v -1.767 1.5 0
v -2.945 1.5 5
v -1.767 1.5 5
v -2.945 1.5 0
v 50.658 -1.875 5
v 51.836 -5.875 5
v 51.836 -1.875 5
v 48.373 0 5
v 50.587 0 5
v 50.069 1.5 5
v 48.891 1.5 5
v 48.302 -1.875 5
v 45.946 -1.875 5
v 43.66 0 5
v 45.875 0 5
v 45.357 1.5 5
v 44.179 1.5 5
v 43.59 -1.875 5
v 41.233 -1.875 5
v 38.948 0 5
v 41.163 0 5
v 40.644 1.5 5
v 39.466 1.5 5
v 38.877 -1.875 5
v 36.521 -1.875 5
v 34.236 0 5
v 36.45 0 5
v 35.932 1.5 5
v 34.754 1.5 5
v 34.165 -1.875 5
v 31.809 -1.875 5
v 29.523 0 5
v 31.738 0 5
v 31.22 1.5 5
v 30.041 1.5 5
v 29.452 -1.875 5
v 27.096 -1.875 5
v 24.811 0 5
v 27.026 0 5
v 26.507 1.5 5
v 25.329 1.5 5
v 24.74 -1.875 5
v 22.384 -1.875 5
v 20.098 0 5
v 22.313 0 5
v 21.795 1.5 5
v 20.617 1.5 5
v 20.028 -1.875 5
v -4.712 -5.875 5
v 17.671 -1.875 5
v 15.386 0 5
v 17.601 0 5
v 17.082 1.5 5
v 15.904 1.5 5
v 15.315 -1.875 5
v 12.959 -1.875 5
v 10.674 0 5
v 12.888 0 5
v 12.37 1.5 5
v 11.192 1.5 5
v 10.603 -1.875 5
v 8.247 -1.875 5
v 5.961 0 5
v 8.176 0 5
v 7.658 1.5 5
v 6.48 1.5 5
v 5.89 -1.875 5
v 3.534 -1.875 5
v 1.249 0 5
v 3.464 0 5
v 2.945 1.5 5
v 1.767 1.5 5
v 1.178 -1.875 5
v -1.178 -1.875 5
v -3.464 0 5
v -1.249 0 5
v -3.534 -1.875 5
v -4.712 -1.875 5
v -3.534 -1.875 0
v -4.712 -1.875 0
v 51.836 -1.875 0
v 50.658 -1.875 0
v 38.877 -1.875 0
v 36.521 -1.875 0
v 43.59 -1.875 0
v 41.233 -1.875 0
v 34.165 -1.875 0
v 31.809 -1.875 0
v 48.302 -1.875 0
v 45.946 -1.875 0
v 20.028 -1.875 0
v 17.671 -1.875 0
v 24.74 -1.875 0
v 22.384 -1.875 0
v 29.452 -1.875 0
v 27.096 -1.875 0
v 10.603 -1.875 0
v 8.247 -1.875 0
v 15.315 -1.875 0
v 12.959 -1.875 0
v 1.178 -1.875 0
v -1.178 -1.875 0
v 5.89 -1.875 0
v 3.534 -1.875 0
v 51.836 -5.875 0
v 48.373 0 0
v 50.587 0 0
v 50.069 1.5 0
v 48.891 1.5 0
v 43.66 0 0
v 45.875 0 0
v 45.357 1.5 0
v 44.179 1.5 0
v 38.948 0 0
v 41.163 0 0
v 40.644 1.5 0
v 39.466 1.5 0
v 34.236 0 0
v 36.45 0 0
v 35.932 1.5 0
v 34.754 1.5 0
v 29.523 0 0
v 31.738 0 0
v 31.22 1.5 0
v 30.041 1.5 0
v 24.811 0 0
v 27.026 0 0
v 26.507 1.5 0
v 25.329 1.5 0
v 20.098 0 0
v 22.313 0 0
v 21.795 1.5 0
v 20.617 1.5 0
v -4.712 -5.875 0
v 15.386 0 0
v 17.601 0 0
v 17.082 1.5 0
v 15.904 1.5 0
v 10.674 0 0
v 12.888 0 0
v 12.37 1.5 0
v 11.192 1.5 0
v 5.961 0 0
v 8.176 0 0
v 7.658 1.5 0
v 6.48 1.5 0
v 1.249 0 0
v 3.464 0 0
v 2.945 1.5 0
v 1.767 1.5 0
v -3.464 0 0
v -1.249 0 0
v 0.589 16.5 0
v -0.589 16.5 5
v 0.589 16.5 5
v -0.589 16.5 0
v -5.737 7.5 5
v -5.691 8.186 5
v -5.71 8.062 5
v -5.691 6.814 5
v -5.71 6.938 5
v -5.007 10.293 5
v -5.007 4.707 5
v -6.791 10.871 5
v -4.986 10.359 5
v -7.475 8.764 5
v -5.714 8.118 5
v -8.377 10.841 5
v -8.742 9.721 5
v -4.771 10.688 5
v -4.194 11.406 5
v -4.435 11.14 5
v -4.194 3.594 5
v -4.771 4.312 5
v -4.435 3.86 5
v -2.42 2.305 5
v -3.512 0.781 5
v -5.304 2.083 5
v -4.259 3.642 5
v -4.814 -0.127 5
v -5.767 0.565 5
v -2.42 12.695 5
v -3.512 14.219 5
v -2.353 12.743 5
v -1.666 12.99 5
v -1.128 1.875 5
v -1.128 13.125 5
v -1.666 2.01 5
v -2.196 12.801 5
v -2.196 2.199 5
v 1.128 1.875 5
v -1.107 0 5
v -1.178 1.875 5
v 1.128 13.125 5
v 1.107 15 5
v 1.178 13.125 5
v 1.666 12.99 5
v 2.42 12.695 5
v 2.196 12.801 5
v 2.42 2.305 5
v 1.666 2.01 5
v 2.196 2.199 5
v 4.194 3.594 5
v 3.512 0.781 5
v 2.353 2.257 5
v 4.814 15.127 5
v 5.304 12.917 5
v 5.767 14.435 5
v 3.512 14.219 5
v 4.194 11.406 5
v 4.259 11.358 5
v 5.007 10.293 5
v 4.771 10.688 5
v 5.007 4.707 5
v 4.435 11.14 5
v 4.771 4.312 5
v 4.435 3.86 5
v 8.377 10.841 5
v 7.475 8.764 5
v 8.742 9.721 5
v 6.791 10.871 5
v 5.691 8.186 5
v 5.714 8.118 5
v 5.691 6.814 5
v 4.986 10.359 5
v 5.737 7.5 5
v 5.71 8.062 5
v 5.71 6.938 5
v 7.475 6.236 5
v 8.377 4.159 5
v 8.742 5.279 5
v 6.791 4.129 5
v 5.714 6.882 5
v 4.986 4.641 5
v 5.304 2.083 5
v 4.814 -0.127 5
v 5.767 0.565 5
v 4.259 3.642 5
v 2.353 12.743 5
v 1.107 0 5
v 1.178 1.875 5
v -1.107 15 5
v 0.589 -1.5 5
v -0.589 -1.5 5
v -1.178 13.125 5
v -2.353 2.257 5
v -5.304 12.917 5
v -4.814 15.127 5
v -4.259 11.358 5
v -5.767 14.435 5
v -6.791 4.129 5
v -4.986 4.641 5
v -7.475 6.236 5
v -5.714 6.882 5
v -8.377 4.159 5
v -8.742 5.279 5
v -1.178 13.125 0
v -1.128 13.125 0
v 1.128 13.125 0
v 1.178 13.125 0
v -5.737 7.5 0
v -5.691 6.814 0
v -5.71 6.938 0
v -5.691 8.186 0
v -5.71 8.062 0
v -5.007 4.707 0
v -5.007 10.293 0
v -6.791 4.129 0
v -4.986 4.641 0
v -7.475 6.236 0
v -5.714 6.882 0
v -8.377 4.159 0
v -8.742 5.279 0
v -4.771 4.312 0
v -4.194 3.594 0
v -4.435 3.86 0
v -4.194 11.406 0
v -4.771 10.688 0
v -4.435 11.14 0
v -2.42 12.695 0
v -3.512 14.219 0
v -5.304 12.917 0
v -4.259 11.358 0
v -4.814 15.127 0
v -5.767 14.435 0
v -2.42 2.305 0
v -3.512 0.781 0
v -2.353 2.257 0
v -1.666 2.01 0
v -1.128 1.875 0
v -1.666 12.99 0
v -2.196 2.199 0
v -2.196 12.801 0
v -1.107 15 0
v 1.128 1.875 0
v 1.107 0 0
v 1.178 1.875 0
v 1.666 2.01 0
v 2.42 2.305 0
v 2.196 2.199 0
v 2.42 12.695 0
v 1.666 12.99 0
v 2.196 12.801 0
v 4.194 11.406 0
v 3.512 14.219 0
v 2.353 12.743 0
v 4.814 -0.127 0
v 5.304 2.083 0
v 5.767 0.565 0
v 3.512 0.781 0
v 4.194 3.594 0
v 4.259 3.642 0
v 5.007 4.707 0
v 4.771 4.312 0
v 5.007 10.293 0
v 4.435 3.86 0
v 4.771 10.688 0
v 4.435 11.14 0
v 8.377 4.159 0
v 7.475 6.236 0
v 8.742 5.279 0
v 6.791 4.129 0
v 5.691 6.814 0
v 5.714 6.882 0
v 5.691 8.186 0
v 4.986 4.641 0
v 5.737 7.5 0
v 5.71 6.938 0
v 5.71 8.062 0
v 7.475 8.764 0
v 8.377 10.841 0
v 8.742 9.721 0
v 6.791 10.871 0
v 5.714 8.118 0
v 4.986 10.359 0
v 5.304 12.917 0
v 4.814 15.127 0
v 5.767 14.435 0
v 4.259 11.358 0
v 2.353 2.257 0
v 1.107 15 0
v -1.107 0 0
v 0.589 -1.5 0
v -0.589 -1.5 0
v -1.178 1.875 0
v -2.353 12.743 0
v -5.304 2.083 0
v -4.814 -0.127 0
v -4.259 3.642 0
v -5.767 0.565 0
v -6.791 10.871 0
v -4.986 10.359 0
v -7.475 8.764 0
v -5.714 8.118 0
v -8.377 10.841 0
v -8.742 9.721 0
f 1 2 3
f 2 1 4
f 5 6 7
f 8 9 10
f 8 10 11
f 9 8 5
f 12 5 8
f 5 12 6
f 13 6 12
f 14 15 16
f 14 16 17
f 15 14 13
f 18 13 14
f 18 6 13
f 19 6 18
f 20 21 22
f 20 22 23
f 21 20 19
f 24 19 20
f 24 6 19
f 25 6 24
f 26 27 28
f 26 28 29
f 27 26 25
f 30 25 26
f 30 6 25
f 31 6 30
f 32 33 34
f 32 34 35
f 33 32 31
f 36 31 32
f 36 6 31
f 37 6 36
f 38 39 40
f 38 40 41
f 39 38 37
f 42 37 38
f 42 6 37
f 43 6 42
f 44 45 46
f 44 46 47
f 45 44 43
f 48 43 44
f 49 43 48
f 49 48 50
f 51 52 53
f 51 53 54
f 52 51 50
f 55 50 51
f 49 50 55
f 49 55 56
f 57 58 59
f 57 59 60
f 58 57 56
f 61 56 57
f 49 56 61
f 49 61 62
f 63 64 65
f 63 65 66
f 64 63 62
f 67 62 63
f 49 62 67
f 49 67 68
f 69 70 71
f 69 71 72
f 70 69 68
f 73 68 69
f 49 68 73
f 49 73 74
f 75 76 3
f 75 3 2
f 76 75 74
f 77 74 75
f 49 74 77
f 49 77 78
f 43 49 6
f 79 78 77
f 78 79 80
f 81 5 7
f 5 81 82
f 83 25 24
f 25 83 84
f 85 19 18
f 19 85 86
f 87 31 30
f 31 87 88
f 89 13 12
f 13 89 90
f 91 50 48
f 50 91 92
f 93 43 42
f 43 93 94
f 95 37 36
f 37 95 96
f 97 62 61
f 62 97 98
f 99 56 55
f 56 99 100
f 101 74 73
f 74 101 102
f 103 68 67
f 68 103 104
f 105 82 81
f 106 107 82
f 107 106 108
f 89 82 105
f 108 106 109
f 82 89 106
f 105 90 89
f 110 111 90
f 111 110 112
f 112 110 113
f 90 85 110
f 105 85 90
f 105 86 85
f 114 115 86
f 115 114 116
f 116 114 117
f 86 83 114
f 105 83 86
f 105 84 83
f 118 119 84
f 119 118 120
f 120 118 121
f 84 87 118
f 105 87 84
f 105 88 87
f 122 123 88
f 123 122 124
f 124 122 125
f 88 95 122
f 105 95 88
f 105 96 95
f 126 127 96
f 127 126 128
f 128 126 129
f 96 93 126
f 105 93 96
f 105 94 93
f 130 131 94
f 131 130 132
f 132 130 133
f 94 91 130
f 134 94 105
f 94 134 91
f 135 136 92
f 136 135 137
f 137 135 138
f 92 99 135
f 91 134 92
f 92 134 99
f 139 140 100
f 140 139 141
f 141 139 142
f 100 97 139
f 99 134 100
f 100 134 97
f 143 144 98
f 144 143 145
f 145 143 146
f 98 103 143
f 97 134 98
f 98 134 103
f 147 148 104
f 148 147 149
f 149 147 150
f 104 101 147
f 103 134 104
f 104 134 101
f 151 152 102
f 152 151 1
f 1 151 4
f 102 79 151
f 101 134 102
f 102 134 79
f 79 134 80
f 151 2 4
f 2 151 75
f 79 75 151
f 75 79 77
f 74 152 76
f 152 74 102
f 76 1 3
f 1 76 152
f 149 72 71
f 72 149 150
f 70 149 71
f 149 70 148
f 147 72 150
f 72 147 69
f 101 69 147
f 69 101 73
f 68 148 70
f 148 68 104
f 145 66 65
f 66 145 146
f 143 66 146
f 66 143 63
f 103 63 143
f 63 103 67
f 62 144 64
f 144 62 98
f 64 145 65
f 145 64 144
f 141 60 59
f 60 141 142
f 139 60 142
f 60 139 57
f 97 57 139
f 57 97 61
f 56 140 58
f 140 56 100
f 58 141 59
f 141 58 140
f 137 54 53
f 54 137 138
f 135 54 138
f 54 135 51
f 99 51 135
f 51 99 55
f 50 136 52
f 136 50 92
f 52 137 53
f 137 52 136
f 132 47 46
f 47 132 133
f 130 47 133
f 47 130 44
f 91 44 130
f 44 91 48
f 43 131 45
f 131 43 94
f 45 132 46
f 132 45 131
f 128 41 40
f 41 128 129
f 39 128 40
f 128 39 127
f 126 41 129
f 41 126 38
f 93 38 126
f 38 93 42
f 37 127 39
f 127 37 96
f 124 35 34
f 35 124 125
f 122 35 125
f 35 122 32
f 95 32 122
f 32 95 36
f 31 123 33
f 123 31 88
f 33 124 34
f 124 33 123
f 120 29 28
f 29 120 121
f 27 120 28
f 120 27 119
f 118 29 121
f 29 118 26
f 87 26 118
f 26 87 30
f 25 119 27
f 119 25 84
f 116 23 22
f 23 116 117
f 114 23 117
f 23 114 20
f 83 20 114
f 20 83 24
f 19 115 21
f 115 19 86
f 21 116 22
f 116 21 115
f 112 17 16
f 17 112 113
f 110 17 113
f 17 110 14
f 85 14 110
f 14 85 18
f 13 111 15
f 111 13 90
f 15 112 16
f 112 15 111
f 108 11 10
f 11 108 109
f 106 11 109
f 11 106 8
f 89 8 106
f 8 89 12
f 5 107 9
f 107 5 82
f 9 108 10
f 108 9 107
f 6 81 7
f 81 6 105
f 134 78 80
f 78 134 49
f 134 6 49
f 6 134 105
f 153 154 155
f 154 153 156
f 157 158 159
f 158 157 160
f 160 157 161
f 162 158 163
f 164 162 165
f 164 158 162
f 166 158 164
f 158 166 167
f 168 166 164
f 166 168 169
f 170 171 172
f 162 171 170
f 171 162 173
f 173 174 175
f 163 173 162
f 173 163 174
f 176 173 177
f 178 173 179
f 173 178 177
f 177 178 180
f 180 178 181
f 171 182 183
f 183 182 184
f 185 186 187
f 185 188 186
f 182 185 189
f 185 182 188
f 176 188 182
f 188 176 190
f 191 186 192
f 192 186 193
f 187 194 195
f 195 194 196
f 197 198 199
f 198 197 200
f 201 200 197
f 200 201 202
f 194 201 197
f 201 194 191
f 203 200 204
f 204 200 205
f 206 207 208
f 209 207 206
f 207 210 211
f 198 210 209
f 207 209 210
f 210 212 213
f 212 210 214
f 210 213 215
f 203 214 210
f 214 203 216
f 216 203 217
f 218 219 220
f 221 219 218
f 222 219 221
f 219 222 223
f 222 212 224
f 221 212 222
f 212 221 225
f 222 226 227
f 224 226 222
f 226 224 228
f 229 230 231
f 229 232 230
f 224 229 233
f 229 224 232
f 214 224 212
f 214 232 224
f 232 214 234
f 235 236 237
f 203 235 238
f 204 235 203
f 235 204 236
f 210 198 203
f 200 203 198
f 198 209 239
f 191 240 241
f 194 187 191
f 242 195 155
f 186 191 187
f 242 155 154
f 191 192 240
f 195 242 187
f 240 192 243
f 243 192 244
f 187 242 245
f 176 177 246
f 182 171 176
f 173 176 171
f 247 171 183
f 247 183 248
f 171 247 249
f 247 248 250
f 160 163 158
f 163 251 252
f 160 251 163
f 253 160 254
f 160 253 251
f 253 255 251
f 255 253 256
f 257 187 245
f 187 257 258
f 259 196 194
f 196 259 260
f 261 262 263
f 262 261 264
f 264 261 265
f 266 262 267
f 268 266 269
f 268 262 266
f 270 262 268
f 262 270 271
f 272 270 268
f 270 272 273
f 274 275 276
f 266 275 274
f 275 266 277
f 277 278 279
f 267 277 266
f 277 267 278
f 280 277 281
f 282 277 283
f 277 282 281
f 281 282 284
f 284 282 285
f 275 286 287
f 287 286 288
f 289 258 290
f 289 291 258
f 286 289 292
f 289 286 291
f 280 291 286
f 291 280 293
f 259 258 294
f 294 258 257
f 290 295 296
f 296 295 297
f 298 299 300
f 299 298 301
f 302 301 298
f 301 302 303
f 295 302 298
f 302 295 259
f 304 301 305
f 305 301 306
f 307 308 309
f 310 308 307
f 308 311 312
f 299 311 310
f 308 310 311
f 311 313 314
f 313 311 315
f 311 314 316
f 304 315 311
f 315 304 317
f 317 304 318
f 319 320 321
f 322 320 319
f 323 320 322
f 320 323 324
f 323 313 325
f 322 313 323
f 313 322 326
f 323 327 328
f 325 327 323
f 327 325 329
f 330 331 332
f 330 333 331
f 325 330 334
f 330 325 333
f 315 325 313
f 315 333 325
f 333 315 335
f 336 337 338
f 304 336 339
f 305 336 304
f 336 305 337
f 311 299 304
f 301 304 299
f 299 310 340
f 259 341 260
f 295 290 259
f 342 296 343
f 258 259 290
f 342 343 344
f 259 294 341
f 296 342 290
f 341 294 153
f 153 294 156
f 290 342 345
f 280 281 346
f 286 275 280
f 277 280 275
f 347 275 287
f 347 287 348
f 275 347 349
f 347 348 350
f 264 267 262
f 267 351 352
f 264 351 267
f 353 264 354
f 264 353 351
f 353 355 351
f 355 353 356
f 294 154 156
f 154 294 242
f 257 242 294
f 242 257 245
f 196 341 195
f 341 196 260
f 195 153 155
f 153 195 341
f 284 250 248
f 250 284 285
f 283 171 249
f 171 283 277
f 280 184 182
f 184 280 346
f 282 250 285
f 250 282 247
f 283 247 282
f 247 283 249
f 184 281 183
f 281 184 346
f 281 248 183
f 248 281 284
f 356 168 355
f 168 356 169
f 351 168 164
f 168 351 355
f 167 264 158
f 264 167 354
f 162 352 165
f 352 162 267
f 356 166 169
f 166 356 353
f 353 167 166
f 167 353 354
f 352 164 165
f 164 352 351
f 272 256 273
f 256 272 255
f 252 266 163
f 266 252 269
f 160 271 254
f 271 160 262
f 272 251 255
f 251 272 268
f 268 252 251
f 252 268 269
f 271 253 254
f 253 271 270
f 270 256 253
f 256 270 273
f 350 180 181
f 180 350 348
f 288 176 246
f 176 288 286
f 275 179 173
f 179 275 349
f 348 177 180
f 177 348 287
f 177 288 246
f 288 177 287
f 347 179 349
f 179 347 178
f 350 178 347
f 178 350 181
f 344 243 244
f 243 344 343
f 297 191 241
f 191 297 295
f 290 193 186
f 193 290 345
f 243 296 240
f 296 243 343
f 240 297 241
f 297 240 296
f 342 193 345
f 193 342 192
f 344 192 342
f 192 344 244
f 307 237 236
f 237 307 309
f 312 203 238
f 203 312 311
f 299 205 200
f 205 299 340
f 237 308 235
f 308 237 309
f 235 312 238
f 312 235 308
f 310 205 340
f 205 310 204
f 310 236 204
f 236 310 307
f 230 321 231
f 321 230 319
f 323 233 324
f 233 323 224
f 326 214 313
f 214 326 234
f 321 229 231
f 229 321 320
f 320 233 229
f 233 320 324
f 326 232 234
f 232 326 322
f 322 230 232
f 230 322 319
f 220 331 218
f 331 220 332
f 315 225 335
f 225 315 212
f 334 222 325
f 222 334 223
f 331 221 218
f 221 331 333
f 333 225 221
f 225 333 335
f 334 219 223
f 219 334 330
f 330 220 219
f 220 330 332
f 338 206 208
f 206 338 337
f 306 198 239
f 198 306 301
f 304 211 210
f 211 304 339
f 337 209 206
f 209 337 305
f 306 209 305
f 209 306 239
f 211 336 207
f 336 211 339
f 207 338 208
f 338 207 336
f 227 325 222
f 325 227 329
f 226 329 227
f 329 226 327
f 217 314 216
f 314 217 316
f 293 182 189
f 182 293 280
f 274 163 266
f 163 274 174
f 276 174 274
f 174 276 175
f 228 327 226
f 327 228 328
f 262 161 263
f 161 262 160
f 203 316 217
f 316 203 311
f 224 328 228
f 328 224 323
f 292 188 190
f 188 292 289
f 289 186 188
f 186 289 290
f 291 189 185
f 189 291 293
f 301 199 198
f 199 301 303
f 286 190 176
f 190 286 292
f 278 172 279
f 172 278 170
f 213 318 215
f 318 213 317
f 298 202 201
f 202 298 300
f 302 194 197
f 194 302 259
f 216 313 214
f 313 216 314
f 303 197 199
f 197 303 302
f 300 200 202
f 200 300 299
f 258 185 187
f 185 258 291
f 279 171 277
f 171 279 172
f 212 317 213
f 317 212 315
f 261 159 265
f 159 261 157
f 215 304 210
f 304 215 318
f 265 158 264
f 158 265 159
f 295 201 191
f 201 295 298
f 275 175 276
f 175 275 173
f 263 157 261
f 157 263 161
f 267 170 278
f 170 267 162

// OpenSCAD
mod = 1.5;        // Module (mm)
teeth = 10;       // Pinion teeth
thickness = 5;    // Extrusion height (mm)
rack_teeth = 12;
rack_pos = $t; // [0:0.001:1]

pitch = PI * mod;
pitch_d = mod * teeth;
addendum = mod;
dedendum = 1.25 * mod;
top_w = pitch * 0.25;
mid_w = pitch * 0.47;
bot_w = pitch * 0.5;

module rack_tooth() {
    linear_extrude(height = thickness, center = false) {
        polygon(points=[
        [-bot_w/2, -dedendum],
        [ bot_w/2, -dedendum],
        [ mid_w/2, 0],
        [ top_w/2,  addendum],
        [-top_w/2,  addendum],
        [-mid_w/2, 0]
        ]);
    }
}

module rack() {
    len = rack_teeth * pitch;
    union() {
        translate([0, -dedendum - 4, 0])
            cube([len, 4, thickness]);
        for (i = [0 : rack_teeth - 1]) {
            translate([(i + 0.5) * pitch, 0, 0])
                rack_tooth();
        }
    }
}

module pinion() {
    extra_radius_factor = 1.02; // need to cover the base of the teeth
    root_r = (pitch_d / 2 - dedendum) * extra_radius_factor;
    union() {
        cylinder(h = thickness, r = root_r, $fn = 64);
        for (i = [0 : teeth - 1]) {
            rotate([0, 0, i * (360 / teeth)])
                translate([0, pitch_d / 2, 0])
                    rack_tooth();
        }
    }
}

degrees_per_tooth = 360 / teeth;
degrees_per_rack = degrees_per_tooth * rack_teeth;

translate([-pitch - rack_teeth * pitch * rack_pos,0,0])
    rack();
translate([0, pitch_d / 2, 0])
    rotate([0,0,degrees_per_rack*-rack_pos])
        pinion();
